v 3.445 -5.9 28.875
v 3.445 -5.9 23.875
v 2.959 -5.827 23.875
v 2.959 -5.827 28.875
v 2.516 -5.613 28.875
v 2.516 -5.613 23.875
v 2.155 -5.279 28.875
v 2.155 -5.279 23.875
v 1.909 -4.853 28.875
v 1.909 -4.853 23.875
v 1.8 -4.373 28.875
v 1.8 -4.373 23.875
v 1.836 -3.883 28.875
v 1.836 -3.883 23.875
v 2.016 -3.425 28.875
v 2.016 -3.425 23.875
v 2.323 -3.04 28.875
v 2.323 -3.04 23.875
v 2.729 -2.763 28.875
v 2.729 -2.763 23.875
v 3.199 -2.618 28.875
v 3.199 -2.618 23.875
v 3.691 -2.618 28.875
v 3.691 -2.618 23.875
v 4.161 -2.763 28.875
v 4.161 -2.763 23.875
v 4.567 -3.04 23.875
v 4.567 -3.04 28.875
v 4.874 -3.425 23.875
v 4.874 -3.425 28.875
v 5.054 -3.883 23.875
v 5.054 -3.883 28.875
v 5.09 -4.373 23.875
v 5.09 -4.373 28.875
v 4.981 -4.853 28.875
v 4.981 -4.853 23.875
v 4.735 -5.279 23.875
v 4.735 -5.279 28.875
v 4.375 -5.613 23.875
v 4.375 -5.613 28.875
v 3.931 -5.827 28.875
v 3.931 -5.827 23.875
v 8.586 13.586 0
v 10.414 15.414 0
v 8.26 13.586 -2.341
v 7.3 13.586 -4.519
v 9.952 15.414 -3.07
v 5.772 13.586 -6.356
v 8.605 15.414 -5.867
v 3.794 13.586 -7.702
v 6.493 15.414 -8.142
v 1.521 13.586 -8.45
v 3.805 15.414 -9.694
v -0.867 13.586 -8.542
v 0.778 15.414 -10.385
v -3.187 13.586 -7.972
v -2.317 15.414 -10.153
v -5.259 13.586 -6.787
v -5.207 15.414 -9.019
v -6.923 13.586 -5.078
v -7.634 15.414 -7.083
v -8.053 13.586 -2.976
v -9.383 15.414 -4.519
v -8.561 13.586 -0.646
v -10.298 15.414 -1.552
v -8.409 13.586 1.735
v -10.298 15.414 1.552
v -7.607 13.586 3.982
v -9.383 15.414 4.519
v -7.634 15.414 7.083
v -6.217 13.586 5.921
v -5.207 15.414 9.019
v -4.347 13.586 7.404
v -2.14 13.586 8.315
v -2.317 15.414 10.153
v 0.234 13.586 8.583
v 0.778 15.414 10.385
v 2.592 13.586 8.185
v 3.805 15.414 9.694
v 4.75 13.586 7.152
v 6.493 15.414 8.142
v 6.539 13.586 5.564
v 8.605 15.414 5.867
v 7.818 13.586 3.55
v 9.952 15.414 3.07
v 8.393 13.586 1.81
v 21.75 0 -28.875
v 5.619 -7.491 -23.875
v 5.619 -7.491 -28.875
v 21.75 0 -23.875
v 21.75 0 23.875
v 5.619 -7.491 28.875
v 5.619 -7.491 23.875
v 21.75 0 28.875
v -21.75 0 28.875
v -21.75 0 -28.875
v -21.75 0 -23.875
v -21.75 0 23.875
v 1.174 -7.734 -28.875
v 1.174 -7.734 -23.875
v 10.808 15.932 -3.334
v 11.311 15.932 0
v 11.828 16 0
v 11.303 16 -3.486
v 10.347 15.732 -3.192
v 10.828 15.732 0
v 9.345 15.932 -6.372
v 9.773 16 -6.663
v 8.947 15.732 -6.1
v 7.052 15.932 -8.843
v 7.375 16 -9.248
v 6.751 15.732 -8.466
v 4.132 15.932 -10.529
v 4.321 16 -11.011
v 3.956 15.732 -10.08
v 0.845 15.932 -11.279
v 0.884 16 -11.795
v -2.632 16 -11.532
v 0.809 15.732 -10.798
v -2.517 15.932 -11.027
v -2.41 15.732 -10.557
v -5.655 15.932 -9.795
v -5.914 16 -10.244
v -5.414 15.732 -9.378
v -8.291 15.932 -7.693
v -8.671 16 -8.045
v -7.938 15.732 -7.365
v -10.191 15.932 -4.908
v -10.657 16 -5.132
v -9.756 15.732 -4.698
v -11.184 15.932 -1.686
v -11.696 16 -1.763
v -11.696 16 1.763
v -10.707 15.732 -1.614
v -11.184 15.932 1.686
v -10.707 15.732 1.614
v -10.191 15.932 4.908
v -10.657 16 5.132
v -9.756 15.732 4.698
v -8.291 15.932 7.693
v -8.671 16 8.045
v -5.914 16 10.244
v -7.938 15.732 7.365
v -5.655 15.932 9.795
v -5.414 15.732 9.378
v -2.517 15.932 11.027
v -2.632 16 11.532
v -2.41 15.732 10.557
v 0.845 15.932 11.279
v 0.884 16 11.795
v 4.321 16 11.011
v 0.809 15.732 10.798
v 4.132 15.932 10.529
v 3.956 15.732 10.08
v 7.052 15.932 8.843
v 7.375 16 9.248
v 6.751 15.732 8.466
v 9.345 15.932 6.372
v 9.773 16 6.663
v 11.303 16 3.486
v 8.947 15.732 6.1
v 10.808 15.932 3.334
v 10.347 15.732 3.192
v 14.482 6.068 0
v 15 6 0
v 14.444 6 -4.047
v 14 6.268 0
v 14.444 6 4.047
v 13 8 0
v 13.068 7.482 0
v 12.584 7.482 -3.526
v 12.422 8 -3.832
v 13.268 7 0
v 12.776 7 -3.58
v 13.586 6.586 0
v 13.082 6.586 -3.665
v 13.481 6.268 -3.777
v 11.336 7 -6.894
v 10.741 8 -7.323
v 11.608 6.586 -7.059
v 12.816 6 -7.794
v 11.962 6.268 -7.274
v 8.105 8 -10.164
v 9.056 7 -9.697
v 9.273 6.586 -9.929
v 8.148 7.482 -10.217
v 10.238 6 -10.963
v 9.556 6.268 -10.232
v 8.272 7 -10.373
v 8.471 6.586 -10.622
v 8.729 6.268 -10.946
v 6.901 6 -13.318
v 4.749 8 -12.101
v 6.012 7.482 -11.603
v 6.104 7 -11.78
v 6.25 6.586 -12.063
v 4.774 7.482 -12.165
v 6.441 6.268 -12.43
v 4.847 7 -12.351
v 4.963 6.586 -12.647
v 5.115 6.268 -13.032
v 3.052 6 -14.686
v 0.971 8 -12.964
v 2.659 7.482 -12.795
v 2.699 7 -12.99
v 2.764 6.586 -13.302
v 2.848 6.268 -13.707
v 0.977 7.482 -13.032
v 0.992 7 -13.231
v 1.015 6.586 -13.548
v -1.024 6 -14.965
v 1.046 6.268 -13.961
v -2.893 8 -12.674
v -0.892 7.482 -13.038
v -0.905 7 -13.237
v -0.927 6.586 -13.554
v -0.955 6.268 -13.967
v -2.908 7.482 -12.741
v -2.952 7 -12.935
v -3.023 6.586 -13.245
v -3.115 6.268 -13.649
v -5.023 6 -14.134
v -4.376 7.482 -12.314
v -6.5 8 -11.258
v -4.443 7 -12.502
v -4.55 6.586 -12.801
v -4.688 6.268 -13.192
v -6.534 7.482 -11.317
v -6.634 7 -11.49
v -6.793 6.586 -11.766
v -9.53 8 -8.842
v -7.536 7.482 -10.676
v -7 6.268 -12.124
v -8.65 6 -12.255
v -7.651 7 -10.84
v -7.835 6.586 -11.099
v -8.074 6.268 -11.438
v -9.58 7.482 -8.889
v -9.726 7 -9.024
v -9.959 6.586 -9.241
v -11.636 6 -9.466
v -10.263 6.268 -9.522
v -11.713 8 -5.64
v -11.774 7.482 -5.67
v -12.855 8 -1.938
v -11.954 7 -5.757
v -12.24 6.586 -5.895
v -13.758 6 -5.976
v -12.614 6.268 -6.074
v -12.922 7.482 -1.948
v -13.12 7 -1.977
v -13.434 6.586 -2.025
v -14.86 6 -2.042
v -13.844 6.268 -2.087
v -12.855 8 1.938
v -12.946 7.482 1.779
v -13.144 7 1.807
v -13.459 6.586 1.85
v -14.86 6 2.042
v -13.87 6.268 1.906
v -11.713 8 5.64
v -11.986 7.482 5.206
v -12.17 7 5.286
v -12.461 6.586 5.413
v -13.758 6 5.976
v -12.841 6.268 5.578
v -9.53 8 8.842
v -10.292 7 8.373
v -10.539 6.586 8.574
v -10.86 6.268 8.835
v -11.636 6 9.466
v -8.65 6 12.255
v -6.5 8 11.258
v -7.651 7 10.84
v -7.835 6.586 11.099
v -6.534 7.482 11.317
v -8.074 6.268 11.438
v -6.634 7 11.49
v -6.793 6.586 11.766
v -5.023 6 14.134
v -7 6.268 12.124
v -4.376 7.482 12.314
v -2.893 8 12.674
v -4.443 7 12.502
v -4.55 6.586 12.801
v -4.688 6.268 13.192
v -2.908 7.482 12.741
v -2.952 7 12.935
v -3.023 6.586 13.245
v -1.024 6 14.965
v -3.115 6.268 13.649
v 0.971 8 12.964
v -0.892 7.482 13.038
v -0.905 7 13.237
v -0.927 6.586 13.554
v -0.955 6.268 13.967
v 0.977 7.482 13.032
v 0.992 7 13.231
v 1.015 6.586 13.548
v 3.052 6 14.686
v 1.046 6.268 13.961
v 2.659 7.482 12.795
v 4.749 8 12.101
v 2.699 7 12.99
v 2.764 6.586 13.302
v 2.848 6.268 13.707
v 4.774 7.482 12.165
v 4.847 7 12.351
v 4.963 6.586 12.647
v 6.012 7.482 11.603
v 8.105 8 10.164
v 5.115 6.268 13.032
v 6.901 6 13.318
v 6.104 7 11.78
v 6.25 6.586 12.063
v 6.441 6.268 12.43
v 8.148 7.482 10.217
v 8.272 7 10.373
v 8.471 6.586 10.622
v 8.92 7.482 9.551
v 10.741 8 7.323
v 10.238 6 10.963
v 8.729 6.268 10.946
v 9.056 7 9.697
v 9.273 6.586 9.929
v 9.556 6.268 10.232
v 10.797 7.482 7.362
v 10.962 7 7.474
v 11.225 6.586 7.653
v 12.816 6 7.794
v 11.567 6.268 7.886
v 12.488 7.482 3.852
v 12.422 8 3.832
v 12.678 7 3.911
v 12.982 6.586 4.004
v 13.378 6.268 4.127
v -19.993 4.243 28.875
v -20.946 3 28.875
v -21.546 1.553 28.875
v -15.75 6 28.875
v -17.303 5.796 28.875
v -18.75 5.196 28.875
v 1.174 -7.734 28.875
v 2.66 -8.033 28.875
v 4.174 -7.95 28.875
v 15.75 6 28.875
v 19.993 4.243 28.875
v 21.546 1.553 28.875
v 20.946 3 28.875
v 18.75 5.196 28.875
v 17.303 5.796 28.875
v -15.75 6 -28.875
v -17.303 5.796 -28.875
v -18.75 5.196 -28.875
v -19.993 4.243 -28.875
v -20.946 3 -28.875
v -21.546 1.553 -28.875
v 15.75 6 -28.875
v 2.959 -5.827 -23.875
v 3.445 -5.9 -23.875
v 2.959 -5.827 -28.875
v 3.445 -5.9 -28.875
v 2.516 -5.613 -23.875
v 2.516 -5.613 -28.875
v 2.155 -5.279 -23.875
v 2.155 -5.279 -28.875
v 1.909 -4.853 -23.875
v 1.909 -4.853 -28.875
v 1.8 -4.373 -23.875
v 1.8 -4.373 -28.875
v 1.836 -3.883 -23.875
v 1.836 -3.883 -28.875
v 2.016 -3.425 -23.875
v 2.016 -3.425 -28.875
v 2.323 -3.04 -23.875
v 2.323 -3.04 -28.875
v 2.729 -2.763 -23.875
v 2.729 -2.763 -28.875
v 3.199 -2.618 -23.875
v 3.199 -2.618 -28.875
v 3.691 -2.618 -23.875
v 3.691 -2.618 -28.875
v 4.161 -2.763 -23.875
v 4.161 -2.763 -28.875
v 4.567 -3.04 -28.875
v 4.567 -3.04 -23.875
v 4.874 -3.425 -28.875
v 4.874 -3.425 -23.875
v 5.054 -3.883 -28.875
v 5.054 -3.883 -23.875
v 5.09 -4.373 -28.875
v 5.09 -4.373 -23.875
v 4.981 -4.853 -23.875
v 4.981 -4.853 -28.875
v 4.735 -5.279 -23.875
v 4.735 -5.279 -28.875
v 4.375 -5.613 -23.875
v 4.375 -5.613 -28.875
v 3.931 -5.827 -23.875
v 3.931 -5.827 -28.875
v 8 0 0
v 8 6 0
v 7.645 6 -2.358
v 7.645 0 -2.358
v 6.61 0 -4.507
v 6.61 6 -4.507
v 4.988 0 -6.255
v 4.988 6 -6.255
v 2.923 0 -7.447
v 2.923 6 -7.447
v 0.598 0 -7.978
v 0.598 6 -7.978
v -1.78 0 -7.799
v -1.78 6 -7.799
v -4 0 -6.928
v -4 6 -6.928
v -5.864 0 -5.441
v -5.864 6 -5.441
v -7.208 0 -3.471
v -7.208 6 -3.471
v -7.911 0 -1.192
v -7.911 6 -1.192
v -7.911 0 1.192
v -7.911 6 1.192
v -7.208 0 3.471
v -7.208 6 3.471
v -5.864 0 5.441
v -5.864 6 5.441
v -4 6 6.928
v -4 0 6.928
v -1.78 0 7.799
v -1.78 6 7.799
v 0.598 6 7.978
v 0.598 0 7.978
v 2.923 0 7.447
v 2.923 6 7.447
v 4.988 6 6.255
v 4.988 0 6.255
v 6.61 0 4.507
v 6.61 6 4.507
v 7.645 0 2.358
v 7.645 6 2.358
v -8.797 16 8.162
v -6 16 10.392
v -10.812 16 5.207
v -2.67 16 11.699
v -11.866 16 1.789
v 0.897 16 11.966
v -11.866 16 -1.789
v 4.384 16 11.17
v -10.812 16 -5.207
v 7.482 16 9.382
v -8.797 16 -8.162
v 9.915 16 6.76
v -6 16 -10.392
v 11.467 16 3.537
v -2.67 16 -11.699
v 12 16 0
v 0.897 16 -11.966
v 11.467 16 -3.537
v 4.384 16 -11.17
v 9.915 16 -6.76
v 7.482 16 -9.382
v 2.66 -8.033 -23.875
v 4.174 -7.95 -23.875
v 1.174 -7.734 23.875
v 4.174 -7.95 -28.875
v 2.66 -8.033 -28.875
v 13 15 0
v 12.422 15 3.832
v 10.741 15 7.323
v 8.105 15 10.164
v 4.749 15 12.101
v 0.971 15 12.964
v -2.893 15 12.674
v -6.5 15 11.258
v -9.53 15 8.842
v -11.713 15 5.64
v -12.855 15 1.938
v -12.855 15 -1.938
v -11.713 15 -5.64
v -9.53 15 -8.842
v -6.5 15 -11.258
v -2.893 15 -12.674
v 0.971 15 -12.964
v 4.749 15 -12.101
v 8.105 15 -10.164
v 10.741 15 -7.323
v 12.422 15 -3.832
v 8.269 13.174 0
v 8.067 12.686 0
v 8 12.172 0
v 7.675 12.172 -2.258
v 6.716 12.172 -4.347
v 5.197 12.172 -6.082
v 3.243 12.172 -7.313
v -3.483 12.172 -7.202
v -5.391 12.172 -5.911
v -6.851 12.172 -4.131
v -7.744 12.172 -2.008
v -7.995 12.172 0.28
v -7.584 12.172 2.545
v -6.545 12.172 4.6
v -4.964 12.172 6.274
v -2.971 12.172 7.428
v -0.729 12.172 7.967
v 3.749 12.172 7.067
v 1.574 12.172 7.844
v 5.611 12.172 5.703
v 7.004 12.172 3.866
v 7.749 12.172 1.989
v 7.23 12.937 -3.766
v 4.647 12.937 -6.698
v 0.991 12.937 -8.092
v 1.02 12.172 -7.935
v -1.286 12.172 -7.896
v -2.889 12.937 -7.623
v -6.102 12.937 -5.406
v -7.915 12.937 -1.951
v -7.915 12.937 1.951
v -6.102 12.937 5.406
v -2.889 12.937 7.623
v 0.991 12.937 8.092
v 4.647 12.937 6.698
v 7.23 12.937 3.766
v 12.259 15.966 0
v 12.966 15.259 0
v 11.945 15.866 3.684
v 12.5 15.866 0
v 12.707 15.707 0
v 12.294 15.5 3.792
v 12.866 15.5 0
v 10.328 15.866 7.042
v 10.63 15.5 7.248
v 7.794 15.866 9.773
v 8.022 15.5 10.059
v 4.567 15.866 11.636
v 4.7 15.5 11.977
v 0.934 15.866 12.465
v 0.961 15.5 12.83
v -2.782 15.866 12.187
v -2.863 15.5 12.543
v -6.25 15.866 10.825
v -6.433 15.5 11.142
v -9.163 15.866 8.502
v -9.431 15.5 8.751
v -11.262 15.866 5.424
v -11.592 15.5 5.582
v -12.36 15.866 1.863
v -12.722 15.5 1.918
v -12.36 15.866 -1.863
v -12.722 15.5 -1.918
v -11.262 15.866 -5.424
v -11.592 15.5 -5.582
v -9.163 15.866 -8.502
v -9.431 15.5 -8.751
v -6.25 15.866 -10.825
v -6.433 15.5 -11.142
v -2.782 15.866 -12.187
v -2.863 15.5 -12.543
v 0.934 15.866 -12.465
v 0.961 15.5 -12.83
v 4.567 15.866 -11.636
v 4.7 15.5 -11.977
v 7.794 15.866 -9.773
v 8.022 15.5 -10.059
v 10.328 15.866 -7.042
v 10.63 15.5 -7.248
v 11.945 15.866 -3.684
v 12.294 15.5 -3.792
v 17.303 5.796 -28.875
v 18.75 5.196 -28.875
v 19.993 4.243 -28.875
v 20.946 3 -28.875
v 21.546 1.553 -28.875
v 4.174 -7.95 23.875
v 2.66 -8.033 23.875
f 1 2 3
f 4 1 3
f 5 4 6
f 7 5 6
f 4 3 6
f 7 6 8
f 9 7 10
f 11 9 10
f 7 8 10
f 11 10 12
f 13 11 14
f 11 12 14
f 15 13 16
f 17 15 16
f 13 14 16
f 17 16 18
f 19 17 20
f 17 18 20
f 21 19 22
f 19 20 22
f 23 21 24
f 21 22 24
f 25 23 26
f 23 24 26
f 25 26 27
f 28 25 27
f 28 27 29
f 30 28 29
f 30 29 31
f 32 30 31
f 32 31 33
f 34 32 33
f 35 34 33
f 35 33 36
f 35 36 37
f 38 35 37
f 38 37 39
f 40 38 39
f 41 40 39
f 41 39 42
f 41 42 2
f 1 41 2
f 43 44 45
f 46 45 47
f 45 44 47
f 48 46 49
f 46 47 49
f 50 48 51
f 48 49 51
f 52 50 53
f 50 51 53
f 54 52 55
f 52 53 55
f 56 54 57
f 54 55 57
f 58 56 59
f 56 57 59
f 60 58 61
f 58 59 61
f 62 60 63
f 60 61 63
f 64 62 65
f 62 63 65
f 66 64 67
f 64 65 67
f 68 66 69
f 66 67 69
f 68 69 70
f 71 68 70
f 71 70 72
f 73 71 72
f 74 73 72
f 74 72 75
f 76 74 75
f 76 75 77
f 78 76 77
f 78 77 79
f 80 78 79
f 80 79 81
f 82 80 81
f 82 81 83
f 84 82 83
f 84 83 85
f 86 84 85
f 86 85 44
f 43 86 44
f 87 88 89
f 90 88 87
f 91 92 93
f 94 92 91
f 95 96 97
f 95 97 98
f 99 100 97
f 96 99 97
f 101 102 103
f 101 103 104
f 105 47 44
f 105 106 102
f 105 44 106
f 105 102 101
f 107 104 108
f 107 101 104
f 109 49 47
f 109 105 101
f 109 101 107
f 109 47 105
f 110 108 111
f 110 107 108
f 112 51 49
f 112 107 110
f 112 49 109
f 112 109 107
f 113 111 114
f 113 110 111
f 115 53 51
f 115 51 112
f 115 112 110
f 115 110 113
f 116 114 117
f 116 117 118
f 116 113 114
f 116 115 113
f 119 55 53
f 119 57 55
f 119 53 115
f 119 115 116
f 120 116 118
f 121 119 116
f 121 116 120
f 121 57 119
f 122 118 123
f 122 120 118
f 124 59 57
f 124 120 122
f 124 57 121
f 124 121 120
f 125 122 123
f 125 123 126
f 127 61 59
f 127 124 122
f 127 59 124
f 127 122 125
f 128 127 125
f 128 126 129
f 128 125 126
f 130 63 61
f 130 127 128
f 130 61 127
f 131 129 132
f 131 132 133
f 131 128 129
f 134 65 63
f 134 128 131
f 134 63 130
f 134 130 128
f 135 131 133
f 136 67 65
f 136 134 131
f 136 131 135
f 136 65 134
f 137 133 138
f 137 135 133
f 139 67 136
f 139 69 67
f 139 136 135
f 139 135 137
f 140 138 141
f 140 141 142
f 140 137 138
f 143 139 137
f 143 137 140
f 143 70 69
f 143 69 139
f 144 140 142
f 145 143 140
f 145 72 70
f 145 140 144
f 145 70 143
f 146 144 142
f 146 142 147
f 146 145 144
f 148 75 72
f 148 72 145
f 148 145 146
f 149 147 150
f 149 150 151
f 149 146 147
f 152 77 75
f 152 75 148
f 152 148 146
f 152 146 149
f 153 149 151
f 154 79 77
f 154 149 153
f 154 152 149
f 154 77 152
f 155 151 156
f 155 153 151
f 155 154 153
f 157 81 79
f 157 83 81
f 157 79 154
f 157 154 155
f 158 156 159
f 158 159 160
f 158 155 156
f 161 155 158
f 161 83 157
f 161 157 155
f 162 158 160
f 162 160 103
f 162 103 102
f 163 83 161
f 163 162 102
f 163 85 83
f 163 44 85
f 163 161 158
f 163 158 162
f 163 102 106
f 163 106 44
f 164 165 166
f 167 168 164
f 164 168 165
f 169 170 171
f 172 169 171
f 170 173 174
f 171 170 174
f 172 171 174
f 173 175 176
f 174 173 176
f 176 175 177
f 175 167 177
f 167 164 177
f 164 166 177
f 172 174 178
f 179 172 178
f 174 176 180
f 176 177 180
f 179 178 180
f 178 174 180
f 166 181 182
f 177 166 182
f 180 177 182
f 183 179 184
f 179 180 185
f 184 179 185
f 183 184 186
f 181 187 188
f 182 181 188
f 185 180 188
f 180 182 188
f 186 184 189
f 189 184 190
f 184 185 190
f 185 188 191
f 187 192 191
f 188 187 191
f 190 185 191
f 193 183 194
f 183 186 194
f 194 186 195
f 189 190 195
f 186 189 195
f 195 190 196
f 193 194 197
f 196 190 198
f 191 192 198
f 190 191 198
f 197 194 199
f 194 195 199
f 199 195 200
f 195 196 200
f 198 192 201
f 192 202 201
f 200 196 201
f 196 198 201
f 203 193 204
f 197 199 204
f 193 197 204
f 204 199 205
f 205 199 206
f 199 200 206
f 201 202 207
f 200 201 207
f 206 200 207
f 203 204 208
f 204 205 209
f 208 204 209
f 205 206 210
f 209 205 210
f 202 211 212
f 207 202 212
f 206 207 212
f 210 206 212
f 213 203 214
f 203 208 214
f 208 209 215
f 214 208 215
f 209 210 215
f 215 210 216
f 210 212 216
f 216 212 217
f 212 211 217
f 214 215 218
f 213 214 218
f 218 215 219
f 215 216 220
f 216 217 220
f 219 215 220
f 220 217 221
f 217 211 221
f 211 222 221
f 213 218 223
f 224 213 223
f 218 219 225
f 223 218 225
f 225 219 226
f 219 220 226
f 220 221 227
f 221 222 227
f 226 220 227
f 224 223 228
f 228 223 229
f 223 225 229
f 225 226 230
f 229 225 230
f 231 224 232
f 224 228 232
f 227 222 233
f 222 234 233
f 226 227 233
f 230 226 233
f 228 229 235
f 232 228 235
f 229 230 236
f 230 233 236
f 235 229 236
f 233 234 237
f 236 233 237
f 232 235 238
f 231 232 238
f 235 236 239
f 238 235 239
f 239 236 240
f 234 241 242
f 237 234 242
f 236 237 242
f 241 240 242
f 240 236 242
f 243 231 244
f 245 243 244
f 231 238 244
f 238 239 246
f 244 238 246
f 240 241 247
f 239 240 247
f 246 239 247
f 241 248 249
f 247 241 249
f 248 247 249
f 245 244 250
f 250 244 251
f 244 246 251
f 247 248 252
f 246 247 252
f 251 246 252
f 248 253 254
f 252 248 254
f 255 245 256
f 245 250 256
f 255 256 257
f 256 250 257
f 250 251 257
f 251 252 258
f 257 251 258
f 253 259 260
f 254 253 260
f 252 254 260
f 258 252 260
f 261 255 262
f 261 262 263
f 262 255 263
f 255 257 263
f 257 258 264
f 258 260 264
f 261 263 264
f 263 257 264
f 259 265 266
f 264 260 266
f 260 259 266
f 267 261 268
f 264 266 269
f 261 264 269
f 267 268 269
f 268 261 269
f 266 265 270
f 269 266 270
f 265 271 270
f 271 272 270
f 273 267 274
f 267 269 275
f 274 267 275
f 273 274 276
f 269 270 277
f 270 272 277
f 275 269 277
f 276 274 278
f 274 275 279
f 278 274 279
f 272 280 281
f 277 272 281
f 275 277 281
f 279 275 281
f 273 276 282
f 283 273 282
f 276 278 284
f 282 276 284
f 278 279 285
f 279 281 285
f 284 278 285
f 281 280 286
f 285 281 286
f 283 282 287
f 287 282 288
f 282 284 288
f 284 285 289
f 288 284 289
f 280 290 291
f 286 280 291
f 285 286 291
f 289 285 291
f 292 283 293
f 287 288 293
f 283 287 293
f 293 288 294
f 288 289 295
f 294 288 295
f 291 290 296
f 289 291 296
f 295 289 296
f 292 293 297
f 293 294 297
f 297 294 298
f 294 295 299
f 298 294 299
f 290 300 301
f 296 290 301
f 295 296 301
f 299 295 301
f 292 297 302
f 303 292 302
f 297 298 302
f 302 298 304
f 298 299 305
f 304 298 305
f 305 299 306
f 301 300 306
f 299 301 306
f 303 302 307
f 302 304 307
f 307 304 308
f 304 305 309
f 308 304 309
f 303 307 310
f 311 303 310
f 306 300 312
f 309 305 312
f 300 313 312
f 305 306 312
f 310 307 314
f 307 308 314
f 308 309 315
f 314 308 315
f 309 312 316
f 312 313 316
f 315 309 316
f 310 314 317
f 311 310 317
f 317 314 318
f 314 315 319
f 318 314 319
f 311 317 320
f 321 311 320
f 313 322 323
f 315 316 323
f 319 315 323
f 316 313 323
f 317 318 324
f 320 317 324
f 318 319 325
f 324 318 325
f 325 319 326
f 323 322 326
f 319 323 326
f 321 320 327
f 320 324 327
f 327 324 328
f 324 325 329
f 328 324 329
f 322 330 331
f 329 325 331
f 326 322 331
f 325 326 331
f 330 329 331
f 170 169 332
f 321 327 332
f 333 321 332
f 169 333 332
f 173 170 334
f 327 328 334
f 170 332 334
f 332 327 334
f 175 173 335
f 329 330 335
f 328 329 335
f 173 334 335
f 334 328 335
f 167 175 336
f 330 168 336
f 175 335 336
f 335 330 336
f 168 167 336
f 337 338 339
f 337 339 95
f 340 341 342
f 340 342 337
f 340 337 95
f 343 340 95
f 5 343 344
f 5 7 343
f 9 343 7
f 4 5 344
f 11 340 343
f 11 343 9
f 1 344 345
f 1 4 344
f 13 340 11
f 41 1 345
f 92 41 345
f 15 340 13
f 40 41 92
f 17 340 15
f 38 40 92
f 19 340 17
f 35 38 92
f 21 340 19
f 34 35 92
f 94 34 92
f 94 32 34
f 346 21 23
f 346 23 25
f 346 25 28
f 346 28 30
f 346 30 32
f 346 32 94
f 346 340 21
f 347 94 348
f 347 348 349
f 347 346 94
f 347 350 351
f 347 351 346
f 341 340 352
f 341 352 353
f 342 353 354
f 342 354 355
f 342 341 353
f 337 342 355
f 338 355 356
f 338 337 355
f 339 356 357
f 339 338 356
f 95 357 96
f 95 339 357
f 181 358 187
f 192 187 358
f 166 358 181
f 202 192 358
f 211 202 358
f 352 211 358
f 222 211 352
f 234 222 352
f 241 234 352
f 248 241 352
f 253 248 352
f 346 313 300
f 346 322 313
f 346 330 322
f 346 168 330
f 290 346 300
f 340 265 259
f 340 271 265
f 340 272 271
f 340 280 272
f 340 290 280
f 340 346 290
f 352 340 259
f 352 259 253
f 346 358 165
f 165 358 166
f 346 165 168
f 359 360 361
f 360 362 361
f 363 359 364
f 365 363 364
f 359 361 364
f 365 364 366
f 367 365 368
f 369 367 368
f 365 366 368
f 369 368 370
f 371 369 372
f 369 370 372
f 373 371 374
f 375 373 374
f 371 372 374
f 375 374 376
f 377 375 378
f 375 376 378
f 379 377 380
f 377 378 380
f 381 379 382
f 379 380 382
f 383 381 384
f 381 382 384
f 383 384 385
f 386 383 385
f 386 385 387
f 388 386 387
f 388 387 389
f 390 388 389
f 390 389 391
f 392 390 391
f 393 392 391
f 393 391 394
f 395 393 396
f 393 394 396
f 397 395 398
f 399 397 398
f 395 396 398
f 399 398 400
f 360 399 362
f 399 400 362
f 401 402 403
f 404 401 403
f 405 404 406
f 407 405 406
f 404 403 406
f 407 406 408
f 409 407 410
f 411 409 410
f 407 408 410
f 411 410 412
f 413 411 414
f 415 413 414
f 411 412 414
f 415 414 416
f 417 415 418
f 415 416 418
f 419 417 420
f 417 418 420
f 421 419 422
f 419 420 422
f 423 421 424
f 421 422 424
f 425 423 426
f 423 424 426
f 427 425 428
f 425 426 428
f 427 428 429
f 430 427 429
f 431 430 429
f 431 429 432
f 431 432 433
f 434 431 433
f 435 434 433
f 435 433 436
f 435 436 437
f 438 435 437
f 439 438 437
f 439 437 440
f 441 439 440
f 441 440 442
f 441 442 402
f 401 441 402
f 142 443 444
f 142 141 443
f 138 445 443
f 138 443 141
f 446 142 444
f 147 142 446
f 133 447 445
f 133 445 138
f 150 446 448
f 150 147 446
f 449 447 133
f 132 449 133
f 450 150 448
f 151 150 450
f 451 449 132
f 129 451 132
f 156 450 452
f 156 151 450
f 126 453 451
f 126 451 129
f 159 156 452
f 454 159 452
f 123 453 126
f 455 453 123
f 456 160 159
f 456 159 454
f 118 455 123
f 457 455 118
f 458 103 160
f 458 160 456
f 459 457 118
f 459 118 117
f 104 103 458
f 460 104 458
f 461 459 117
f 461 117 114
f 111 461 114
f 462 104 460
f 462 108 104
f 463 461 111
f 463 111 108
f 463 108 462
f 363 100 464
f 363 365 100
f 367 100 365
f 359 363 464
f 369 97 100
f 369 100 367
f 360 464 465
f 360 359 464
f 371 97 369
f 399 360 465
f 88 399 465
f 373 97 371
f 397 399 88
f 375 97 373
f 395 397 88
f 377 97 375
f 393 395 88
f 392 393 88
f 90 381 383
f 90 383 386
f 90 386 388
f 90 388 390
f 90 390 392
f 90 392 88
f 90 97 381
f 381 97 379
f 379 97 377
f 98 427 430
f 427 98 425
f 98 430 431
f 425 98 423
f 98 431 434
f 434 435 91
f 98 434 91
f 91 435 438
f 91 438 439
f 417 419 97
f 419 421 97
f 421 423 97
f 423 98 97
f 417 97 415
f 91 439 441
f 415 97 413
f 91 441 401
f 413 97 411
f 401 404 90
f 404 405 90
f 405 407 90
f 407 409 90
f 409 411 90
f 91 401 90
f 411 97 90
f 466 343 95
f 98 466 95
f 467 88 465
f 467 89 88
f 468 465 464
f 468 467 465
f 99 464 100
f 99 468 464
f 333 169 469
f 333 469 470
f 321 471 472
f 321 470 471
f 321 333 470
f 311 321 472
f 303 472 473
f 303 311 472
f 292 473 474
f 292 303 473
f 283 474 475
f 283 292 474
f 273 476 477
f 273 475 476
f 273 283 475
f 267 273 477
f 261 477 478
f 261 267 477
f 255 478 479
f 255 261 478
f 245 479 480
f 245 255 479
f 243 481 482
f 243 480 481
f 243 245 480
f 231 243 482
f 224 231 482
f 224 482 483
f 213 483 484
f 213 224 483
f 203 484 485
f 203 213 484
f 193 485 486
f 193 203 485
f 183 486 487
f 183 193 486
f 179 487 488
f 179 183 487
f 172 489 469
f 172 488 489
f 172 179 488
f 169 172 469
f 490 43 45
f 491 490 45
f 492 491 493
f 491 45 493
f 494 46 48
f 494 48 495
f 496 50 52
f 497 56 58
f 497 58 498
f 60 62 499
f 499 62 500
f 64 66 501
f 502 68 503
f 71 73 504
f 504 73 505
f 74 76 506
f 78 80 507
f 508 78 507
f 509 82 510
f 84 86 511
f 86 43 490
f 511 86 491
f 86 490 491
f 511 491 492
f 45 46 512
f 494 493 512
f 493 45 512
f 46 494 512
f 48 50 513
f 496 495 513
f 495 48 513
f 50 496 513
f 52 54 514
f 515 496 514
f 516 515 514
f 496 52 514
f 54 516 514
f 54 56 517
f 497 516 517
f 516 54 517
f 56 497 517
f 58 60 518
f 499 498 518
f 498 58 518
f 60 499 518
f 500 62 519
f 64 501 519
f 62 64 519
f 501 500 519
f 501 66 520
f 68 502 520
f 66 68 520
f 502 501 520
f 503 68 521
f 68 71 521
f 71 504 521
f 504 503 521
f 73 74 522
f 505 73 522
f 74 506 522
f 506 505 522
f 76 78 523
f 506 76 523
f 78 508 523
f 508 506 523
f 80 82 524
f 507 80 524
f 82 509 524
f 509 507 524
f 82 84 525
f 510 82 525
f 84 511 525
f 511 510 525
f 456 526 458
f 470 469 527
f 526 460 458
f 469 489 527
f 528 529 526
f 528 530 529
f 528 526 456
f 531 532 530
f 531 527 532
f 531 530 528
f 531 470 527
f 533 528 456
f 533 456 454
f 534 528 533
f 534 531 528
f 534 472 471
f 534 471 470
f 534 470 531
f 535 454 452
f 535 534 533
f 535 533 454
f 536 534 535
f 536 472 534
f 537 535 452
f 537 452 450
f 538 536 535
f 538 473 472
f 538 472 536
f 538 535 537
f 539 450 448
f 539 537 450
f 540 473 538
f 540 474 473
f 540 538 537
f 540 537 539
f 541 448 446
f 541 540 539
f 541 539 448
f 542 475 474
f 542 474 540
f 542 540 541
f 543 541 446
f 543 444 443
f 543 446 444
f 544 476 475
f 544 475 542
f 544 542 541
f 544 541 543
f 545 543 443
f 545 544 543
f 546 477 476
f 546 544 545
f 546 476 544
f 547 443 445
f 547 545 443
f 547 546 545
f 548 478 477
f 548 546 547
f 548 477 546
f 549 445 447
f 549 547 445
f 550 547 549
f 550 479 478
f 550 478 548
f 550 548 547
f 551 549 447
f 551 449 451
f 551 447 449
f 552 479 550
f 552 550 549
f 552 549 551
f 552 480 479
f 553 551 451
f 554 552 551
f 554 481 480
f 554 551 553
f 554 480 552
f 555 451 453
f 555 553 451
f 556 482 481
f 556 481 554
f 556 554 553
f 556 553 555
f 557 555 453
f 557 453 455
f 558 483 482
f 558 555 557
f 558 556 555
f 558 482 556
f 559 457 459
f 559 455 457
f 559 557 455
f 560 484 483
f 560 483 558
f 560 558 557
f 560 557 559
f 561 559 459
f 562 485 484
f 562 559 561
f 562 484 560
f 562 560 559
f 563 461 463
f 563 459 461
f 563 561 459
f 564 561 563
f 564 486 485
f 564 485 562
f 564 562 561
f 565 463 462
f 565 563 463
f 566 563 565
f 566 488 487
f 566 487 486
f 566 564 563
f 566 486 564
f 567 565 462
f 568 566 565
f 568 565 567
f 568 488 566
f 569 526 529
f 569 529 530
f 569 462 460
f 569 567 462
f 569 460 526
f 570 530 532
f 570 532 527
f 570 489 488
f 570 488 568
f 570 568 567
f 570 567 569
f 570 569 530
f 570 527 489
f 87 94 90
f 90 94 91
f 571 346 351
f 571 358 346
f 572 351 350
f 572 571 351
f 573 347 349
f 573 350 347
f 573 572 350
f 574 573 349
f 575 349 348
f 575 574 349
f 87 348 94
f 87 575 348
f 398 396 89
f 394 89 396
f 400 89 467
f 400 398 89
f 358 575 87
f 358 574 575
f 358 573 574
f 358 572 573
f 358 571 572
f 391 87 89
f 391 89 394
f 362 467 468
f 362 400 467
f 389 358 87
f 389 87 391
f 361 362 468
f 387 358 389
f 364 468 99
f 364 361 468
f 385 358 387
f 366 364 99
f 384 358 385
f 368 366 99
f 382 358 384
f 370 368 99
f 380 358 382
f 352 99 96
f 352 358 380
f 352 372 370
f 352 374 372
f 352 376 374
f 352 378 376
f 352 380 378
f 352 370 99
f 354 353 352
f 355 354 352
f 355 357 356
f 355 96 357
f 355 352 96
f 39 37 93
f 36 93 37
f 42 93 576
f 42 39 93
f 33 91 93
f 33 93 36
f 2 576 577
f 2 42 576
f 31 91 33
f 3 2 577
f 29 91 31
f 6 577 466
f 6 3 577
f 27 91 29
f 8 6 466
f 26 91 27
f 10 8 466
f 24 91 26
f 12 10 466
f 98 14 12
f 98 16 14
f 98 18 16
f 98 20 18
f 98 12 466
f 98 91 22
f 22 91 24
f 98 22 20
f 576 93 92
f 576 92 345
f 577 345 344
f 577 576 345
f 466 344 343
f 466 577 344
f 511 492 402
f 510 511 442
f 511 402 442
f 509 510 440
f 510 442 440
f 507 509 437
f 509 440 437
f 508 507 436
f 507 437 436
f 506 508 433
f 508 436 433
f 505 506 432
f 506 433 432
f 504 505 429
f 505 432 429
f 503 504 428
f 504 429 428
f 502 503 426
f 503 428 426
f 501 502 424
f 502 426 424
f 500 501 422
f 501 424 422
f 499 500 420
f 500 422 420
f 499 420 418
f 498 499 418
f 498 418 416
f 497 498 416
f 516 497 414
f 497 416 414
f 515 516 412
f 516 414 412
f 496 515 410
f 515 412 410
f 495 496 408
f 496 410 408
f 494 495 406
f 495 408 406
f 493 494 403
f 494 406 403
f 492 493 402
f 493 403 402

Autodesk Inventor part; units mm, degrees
ref_plane "YZ Plane" through (0, 0, 0) normal (1, 0, 0) x (0, 1, 0)
ref_plane "XZ Plane" through (0, 0, 0) normal (0, 1, 0) x (-1, 0, 0)
ref_plane "XY Plane" through (0, 0, 0) normal (0, 0, 1) x (1, 0, 0)
sketch "Sketch1" plane through (0, 0, 0) normal (0, 1, 0) x (-1, 0, 0)
  line L0 (21.75, 28.875) -> (-21.75, 28.875)
  line L1 (-21.75, 28.875) -> (-21.75, -28.875)
  line L2 (-21.75, -28.875) -> (21.75, -28.875)
  line L3 (21.75, -28.875) -> (21.75, 28.875)
  line L4 (21.75, 28.875) -> (-21.75, -28.875) construction
  line L5 (-21.75, 28.875) -> (21.75, -28.875) construction
  point P0 (0, 0)
  dimension "d0" = 43.5
  dimension "d1" = 57.75
extrude "Extrusion1" add sketch "Sketch1" along normal blind 6
fillet "Fillet1" radius 6 1 edges at (21.75, 6, 0)
fillet "Fillet2" radius 6 1 edges at (-21.75, 6, 0)
sketch "Sketch2" plane through (0, 0, 0) normal (0, -1, 0) x (1, 0, 0)
  line L0 (-21.75, 28.875) -> (21.75, 28.875) projected
  line L1 (-21.75, -28.875) -> (-21.75, 28.875) projected
  line L2 (21.75, -28.875) -> (-21.75, -28.875) projected
  line L3 (21.75, 28.875) -> (21.75, -28.875) projected
  line L4 (21.75, 28.875) -> (21.75, -28.875) construction
  line L5 (21.75, 28.875) -> (3.5, 28.875) construction
  line L6 (-21.75, 28.875) -> (21.75, 28.875) construction
  point P0 (0, 0)
  dimension "d6" = 18.25
extrude "Extrusion2" add sketch "Sketch2" along normal blind 8.5
sketch "Sketch3" plane through (-15.75, 6, 28.875) normal (0, 0, 1) x (1, 0, 0)
  arc A0 (0, 0) -> (-6, -6) centre (0, -6) ccw construction
  line L0 (-6, -6) -> (-6, -14.5) construction
  line L1 (37.5, -14.5) -> (-6, -14.5) construction
  line L2 (37.5, -6) -> (37.5, -14.5) construction
  arc A1 (37.5, -6) -> (31.5, 0) centre (31.5, -6) ccw construction
  line L3 (0, 0) -> (31.5, 0) construction
  line L4 (19.1951, -6) -> (19.1951, -10.25) construction
  point P0 (15.75, -6)
  dimension "d9" = 4.25
hole "Hole1" at (3.4451, -4.25, 28.875) direction (0, 0, -1) diameter 3.3 end through all
sketch "Sketch4" plane through (-15.75, 6, 28.875) normal (0, 0, 1) x (1, 0, 0)
  circle A0 centre (19.1951, -10.25) radius 1.65 construction
  line L0 (19.1951, -10.25) -> (19.1951, -14.5) construction
  line L1 (-6, -14.5) -> (37.5, -14.5) construction
  line L2 (37.5, -6) -> (37.5, -14.5) projected
  line L3 (19.1951, -14.5) -> (37.5, -6)
  line L4 (-6, -6) -> (-6, -14.5) projected
  line L5 (19.1951, -14.5) -> (-6, -6)
  line L6 (-6, -6) -> (-6, -14.5)
  line L7 (19.1951, -14.5) -> (37.5, -14.5)
  line L8 (37.5, -14.5) -> (37.5, -6)
  line L9 (19.1951, -14.5) -> (-6, -14.5)
  point P0 (15.75, -6)
extrude "Extrusion3" cut sketch "Sketch4" against normal through all
fillet "Fillet3" radius 6 1 edges at (3.4451, -8.5, 0)
ref_plane "Work Plane1" through (0, 0, 0) normal (0, 1, 0) x (1, 0, 0)
sketch "Sketch5" plane through (0, 0, 0) normal (0, 1, 0) x (1, 0, 0)
  line L0 (21.75, -28.875) -> (21.75, 28.875) projected
  line L1 (-21.75, 28.875) -> (-21.75, -28.875) projected
  line L2 (21.75, -23.875) -> (-21.75, -23.875)
  line L3 (-21.75, -23.875) -> (-21.75, 23.875)
  line L4 (-21.75, 23.875) -> (21.75, 23.875)
  line L5 (21.75, 23.875) -> (21.75, -23.875)
  line L6 (21.75, -28.875) -> (15.75, -28.875) projected
  line L7 (15.75, 28.875) -> (21.75, 28.875) projected
  point P0 (0, 0)
  dimension "d21" = 5
  dimension "d22" = 5
extrude "Extrusion4" cut sketch "Sketch5" against normal blind 8.5
sketch "Sketch6" plane through (0, 6, 0) normal (0, 1, 0) x (1, 0, 0)
  circle A0 centre (0, 0) radius 8
  dimension "d25" = 16
extrude "Extrusion5" cut sketch "Sketch6" against normal blind 8.5
sketch "Sketch7" plane through (0, 6, 0) normal (0, 1, 0) x (1, 0, 0)
  circle A0 centre (0, 0) radius 8 projected
  circle A1 centre (0, 0) radius 13
  dimension "d28" = 5
extrude "Extrusion6" add sketch "Sketch7" along normal blind 10
fillet "Fillet4" radius 2 1 edges at (-13, 6, 0)
chamfer "Chamfer1" distance 3 angle 45 1 edges at (-8, 16, 0)
fillet "Fillet5" radius 2 2 edges at (-11, 16, 0) (-8, 13, 0)
fillet "Fillet6" radius 1 1 edges at (-13, 16, 0)
equation "\"d22\" = d21"
properties part number "support"
